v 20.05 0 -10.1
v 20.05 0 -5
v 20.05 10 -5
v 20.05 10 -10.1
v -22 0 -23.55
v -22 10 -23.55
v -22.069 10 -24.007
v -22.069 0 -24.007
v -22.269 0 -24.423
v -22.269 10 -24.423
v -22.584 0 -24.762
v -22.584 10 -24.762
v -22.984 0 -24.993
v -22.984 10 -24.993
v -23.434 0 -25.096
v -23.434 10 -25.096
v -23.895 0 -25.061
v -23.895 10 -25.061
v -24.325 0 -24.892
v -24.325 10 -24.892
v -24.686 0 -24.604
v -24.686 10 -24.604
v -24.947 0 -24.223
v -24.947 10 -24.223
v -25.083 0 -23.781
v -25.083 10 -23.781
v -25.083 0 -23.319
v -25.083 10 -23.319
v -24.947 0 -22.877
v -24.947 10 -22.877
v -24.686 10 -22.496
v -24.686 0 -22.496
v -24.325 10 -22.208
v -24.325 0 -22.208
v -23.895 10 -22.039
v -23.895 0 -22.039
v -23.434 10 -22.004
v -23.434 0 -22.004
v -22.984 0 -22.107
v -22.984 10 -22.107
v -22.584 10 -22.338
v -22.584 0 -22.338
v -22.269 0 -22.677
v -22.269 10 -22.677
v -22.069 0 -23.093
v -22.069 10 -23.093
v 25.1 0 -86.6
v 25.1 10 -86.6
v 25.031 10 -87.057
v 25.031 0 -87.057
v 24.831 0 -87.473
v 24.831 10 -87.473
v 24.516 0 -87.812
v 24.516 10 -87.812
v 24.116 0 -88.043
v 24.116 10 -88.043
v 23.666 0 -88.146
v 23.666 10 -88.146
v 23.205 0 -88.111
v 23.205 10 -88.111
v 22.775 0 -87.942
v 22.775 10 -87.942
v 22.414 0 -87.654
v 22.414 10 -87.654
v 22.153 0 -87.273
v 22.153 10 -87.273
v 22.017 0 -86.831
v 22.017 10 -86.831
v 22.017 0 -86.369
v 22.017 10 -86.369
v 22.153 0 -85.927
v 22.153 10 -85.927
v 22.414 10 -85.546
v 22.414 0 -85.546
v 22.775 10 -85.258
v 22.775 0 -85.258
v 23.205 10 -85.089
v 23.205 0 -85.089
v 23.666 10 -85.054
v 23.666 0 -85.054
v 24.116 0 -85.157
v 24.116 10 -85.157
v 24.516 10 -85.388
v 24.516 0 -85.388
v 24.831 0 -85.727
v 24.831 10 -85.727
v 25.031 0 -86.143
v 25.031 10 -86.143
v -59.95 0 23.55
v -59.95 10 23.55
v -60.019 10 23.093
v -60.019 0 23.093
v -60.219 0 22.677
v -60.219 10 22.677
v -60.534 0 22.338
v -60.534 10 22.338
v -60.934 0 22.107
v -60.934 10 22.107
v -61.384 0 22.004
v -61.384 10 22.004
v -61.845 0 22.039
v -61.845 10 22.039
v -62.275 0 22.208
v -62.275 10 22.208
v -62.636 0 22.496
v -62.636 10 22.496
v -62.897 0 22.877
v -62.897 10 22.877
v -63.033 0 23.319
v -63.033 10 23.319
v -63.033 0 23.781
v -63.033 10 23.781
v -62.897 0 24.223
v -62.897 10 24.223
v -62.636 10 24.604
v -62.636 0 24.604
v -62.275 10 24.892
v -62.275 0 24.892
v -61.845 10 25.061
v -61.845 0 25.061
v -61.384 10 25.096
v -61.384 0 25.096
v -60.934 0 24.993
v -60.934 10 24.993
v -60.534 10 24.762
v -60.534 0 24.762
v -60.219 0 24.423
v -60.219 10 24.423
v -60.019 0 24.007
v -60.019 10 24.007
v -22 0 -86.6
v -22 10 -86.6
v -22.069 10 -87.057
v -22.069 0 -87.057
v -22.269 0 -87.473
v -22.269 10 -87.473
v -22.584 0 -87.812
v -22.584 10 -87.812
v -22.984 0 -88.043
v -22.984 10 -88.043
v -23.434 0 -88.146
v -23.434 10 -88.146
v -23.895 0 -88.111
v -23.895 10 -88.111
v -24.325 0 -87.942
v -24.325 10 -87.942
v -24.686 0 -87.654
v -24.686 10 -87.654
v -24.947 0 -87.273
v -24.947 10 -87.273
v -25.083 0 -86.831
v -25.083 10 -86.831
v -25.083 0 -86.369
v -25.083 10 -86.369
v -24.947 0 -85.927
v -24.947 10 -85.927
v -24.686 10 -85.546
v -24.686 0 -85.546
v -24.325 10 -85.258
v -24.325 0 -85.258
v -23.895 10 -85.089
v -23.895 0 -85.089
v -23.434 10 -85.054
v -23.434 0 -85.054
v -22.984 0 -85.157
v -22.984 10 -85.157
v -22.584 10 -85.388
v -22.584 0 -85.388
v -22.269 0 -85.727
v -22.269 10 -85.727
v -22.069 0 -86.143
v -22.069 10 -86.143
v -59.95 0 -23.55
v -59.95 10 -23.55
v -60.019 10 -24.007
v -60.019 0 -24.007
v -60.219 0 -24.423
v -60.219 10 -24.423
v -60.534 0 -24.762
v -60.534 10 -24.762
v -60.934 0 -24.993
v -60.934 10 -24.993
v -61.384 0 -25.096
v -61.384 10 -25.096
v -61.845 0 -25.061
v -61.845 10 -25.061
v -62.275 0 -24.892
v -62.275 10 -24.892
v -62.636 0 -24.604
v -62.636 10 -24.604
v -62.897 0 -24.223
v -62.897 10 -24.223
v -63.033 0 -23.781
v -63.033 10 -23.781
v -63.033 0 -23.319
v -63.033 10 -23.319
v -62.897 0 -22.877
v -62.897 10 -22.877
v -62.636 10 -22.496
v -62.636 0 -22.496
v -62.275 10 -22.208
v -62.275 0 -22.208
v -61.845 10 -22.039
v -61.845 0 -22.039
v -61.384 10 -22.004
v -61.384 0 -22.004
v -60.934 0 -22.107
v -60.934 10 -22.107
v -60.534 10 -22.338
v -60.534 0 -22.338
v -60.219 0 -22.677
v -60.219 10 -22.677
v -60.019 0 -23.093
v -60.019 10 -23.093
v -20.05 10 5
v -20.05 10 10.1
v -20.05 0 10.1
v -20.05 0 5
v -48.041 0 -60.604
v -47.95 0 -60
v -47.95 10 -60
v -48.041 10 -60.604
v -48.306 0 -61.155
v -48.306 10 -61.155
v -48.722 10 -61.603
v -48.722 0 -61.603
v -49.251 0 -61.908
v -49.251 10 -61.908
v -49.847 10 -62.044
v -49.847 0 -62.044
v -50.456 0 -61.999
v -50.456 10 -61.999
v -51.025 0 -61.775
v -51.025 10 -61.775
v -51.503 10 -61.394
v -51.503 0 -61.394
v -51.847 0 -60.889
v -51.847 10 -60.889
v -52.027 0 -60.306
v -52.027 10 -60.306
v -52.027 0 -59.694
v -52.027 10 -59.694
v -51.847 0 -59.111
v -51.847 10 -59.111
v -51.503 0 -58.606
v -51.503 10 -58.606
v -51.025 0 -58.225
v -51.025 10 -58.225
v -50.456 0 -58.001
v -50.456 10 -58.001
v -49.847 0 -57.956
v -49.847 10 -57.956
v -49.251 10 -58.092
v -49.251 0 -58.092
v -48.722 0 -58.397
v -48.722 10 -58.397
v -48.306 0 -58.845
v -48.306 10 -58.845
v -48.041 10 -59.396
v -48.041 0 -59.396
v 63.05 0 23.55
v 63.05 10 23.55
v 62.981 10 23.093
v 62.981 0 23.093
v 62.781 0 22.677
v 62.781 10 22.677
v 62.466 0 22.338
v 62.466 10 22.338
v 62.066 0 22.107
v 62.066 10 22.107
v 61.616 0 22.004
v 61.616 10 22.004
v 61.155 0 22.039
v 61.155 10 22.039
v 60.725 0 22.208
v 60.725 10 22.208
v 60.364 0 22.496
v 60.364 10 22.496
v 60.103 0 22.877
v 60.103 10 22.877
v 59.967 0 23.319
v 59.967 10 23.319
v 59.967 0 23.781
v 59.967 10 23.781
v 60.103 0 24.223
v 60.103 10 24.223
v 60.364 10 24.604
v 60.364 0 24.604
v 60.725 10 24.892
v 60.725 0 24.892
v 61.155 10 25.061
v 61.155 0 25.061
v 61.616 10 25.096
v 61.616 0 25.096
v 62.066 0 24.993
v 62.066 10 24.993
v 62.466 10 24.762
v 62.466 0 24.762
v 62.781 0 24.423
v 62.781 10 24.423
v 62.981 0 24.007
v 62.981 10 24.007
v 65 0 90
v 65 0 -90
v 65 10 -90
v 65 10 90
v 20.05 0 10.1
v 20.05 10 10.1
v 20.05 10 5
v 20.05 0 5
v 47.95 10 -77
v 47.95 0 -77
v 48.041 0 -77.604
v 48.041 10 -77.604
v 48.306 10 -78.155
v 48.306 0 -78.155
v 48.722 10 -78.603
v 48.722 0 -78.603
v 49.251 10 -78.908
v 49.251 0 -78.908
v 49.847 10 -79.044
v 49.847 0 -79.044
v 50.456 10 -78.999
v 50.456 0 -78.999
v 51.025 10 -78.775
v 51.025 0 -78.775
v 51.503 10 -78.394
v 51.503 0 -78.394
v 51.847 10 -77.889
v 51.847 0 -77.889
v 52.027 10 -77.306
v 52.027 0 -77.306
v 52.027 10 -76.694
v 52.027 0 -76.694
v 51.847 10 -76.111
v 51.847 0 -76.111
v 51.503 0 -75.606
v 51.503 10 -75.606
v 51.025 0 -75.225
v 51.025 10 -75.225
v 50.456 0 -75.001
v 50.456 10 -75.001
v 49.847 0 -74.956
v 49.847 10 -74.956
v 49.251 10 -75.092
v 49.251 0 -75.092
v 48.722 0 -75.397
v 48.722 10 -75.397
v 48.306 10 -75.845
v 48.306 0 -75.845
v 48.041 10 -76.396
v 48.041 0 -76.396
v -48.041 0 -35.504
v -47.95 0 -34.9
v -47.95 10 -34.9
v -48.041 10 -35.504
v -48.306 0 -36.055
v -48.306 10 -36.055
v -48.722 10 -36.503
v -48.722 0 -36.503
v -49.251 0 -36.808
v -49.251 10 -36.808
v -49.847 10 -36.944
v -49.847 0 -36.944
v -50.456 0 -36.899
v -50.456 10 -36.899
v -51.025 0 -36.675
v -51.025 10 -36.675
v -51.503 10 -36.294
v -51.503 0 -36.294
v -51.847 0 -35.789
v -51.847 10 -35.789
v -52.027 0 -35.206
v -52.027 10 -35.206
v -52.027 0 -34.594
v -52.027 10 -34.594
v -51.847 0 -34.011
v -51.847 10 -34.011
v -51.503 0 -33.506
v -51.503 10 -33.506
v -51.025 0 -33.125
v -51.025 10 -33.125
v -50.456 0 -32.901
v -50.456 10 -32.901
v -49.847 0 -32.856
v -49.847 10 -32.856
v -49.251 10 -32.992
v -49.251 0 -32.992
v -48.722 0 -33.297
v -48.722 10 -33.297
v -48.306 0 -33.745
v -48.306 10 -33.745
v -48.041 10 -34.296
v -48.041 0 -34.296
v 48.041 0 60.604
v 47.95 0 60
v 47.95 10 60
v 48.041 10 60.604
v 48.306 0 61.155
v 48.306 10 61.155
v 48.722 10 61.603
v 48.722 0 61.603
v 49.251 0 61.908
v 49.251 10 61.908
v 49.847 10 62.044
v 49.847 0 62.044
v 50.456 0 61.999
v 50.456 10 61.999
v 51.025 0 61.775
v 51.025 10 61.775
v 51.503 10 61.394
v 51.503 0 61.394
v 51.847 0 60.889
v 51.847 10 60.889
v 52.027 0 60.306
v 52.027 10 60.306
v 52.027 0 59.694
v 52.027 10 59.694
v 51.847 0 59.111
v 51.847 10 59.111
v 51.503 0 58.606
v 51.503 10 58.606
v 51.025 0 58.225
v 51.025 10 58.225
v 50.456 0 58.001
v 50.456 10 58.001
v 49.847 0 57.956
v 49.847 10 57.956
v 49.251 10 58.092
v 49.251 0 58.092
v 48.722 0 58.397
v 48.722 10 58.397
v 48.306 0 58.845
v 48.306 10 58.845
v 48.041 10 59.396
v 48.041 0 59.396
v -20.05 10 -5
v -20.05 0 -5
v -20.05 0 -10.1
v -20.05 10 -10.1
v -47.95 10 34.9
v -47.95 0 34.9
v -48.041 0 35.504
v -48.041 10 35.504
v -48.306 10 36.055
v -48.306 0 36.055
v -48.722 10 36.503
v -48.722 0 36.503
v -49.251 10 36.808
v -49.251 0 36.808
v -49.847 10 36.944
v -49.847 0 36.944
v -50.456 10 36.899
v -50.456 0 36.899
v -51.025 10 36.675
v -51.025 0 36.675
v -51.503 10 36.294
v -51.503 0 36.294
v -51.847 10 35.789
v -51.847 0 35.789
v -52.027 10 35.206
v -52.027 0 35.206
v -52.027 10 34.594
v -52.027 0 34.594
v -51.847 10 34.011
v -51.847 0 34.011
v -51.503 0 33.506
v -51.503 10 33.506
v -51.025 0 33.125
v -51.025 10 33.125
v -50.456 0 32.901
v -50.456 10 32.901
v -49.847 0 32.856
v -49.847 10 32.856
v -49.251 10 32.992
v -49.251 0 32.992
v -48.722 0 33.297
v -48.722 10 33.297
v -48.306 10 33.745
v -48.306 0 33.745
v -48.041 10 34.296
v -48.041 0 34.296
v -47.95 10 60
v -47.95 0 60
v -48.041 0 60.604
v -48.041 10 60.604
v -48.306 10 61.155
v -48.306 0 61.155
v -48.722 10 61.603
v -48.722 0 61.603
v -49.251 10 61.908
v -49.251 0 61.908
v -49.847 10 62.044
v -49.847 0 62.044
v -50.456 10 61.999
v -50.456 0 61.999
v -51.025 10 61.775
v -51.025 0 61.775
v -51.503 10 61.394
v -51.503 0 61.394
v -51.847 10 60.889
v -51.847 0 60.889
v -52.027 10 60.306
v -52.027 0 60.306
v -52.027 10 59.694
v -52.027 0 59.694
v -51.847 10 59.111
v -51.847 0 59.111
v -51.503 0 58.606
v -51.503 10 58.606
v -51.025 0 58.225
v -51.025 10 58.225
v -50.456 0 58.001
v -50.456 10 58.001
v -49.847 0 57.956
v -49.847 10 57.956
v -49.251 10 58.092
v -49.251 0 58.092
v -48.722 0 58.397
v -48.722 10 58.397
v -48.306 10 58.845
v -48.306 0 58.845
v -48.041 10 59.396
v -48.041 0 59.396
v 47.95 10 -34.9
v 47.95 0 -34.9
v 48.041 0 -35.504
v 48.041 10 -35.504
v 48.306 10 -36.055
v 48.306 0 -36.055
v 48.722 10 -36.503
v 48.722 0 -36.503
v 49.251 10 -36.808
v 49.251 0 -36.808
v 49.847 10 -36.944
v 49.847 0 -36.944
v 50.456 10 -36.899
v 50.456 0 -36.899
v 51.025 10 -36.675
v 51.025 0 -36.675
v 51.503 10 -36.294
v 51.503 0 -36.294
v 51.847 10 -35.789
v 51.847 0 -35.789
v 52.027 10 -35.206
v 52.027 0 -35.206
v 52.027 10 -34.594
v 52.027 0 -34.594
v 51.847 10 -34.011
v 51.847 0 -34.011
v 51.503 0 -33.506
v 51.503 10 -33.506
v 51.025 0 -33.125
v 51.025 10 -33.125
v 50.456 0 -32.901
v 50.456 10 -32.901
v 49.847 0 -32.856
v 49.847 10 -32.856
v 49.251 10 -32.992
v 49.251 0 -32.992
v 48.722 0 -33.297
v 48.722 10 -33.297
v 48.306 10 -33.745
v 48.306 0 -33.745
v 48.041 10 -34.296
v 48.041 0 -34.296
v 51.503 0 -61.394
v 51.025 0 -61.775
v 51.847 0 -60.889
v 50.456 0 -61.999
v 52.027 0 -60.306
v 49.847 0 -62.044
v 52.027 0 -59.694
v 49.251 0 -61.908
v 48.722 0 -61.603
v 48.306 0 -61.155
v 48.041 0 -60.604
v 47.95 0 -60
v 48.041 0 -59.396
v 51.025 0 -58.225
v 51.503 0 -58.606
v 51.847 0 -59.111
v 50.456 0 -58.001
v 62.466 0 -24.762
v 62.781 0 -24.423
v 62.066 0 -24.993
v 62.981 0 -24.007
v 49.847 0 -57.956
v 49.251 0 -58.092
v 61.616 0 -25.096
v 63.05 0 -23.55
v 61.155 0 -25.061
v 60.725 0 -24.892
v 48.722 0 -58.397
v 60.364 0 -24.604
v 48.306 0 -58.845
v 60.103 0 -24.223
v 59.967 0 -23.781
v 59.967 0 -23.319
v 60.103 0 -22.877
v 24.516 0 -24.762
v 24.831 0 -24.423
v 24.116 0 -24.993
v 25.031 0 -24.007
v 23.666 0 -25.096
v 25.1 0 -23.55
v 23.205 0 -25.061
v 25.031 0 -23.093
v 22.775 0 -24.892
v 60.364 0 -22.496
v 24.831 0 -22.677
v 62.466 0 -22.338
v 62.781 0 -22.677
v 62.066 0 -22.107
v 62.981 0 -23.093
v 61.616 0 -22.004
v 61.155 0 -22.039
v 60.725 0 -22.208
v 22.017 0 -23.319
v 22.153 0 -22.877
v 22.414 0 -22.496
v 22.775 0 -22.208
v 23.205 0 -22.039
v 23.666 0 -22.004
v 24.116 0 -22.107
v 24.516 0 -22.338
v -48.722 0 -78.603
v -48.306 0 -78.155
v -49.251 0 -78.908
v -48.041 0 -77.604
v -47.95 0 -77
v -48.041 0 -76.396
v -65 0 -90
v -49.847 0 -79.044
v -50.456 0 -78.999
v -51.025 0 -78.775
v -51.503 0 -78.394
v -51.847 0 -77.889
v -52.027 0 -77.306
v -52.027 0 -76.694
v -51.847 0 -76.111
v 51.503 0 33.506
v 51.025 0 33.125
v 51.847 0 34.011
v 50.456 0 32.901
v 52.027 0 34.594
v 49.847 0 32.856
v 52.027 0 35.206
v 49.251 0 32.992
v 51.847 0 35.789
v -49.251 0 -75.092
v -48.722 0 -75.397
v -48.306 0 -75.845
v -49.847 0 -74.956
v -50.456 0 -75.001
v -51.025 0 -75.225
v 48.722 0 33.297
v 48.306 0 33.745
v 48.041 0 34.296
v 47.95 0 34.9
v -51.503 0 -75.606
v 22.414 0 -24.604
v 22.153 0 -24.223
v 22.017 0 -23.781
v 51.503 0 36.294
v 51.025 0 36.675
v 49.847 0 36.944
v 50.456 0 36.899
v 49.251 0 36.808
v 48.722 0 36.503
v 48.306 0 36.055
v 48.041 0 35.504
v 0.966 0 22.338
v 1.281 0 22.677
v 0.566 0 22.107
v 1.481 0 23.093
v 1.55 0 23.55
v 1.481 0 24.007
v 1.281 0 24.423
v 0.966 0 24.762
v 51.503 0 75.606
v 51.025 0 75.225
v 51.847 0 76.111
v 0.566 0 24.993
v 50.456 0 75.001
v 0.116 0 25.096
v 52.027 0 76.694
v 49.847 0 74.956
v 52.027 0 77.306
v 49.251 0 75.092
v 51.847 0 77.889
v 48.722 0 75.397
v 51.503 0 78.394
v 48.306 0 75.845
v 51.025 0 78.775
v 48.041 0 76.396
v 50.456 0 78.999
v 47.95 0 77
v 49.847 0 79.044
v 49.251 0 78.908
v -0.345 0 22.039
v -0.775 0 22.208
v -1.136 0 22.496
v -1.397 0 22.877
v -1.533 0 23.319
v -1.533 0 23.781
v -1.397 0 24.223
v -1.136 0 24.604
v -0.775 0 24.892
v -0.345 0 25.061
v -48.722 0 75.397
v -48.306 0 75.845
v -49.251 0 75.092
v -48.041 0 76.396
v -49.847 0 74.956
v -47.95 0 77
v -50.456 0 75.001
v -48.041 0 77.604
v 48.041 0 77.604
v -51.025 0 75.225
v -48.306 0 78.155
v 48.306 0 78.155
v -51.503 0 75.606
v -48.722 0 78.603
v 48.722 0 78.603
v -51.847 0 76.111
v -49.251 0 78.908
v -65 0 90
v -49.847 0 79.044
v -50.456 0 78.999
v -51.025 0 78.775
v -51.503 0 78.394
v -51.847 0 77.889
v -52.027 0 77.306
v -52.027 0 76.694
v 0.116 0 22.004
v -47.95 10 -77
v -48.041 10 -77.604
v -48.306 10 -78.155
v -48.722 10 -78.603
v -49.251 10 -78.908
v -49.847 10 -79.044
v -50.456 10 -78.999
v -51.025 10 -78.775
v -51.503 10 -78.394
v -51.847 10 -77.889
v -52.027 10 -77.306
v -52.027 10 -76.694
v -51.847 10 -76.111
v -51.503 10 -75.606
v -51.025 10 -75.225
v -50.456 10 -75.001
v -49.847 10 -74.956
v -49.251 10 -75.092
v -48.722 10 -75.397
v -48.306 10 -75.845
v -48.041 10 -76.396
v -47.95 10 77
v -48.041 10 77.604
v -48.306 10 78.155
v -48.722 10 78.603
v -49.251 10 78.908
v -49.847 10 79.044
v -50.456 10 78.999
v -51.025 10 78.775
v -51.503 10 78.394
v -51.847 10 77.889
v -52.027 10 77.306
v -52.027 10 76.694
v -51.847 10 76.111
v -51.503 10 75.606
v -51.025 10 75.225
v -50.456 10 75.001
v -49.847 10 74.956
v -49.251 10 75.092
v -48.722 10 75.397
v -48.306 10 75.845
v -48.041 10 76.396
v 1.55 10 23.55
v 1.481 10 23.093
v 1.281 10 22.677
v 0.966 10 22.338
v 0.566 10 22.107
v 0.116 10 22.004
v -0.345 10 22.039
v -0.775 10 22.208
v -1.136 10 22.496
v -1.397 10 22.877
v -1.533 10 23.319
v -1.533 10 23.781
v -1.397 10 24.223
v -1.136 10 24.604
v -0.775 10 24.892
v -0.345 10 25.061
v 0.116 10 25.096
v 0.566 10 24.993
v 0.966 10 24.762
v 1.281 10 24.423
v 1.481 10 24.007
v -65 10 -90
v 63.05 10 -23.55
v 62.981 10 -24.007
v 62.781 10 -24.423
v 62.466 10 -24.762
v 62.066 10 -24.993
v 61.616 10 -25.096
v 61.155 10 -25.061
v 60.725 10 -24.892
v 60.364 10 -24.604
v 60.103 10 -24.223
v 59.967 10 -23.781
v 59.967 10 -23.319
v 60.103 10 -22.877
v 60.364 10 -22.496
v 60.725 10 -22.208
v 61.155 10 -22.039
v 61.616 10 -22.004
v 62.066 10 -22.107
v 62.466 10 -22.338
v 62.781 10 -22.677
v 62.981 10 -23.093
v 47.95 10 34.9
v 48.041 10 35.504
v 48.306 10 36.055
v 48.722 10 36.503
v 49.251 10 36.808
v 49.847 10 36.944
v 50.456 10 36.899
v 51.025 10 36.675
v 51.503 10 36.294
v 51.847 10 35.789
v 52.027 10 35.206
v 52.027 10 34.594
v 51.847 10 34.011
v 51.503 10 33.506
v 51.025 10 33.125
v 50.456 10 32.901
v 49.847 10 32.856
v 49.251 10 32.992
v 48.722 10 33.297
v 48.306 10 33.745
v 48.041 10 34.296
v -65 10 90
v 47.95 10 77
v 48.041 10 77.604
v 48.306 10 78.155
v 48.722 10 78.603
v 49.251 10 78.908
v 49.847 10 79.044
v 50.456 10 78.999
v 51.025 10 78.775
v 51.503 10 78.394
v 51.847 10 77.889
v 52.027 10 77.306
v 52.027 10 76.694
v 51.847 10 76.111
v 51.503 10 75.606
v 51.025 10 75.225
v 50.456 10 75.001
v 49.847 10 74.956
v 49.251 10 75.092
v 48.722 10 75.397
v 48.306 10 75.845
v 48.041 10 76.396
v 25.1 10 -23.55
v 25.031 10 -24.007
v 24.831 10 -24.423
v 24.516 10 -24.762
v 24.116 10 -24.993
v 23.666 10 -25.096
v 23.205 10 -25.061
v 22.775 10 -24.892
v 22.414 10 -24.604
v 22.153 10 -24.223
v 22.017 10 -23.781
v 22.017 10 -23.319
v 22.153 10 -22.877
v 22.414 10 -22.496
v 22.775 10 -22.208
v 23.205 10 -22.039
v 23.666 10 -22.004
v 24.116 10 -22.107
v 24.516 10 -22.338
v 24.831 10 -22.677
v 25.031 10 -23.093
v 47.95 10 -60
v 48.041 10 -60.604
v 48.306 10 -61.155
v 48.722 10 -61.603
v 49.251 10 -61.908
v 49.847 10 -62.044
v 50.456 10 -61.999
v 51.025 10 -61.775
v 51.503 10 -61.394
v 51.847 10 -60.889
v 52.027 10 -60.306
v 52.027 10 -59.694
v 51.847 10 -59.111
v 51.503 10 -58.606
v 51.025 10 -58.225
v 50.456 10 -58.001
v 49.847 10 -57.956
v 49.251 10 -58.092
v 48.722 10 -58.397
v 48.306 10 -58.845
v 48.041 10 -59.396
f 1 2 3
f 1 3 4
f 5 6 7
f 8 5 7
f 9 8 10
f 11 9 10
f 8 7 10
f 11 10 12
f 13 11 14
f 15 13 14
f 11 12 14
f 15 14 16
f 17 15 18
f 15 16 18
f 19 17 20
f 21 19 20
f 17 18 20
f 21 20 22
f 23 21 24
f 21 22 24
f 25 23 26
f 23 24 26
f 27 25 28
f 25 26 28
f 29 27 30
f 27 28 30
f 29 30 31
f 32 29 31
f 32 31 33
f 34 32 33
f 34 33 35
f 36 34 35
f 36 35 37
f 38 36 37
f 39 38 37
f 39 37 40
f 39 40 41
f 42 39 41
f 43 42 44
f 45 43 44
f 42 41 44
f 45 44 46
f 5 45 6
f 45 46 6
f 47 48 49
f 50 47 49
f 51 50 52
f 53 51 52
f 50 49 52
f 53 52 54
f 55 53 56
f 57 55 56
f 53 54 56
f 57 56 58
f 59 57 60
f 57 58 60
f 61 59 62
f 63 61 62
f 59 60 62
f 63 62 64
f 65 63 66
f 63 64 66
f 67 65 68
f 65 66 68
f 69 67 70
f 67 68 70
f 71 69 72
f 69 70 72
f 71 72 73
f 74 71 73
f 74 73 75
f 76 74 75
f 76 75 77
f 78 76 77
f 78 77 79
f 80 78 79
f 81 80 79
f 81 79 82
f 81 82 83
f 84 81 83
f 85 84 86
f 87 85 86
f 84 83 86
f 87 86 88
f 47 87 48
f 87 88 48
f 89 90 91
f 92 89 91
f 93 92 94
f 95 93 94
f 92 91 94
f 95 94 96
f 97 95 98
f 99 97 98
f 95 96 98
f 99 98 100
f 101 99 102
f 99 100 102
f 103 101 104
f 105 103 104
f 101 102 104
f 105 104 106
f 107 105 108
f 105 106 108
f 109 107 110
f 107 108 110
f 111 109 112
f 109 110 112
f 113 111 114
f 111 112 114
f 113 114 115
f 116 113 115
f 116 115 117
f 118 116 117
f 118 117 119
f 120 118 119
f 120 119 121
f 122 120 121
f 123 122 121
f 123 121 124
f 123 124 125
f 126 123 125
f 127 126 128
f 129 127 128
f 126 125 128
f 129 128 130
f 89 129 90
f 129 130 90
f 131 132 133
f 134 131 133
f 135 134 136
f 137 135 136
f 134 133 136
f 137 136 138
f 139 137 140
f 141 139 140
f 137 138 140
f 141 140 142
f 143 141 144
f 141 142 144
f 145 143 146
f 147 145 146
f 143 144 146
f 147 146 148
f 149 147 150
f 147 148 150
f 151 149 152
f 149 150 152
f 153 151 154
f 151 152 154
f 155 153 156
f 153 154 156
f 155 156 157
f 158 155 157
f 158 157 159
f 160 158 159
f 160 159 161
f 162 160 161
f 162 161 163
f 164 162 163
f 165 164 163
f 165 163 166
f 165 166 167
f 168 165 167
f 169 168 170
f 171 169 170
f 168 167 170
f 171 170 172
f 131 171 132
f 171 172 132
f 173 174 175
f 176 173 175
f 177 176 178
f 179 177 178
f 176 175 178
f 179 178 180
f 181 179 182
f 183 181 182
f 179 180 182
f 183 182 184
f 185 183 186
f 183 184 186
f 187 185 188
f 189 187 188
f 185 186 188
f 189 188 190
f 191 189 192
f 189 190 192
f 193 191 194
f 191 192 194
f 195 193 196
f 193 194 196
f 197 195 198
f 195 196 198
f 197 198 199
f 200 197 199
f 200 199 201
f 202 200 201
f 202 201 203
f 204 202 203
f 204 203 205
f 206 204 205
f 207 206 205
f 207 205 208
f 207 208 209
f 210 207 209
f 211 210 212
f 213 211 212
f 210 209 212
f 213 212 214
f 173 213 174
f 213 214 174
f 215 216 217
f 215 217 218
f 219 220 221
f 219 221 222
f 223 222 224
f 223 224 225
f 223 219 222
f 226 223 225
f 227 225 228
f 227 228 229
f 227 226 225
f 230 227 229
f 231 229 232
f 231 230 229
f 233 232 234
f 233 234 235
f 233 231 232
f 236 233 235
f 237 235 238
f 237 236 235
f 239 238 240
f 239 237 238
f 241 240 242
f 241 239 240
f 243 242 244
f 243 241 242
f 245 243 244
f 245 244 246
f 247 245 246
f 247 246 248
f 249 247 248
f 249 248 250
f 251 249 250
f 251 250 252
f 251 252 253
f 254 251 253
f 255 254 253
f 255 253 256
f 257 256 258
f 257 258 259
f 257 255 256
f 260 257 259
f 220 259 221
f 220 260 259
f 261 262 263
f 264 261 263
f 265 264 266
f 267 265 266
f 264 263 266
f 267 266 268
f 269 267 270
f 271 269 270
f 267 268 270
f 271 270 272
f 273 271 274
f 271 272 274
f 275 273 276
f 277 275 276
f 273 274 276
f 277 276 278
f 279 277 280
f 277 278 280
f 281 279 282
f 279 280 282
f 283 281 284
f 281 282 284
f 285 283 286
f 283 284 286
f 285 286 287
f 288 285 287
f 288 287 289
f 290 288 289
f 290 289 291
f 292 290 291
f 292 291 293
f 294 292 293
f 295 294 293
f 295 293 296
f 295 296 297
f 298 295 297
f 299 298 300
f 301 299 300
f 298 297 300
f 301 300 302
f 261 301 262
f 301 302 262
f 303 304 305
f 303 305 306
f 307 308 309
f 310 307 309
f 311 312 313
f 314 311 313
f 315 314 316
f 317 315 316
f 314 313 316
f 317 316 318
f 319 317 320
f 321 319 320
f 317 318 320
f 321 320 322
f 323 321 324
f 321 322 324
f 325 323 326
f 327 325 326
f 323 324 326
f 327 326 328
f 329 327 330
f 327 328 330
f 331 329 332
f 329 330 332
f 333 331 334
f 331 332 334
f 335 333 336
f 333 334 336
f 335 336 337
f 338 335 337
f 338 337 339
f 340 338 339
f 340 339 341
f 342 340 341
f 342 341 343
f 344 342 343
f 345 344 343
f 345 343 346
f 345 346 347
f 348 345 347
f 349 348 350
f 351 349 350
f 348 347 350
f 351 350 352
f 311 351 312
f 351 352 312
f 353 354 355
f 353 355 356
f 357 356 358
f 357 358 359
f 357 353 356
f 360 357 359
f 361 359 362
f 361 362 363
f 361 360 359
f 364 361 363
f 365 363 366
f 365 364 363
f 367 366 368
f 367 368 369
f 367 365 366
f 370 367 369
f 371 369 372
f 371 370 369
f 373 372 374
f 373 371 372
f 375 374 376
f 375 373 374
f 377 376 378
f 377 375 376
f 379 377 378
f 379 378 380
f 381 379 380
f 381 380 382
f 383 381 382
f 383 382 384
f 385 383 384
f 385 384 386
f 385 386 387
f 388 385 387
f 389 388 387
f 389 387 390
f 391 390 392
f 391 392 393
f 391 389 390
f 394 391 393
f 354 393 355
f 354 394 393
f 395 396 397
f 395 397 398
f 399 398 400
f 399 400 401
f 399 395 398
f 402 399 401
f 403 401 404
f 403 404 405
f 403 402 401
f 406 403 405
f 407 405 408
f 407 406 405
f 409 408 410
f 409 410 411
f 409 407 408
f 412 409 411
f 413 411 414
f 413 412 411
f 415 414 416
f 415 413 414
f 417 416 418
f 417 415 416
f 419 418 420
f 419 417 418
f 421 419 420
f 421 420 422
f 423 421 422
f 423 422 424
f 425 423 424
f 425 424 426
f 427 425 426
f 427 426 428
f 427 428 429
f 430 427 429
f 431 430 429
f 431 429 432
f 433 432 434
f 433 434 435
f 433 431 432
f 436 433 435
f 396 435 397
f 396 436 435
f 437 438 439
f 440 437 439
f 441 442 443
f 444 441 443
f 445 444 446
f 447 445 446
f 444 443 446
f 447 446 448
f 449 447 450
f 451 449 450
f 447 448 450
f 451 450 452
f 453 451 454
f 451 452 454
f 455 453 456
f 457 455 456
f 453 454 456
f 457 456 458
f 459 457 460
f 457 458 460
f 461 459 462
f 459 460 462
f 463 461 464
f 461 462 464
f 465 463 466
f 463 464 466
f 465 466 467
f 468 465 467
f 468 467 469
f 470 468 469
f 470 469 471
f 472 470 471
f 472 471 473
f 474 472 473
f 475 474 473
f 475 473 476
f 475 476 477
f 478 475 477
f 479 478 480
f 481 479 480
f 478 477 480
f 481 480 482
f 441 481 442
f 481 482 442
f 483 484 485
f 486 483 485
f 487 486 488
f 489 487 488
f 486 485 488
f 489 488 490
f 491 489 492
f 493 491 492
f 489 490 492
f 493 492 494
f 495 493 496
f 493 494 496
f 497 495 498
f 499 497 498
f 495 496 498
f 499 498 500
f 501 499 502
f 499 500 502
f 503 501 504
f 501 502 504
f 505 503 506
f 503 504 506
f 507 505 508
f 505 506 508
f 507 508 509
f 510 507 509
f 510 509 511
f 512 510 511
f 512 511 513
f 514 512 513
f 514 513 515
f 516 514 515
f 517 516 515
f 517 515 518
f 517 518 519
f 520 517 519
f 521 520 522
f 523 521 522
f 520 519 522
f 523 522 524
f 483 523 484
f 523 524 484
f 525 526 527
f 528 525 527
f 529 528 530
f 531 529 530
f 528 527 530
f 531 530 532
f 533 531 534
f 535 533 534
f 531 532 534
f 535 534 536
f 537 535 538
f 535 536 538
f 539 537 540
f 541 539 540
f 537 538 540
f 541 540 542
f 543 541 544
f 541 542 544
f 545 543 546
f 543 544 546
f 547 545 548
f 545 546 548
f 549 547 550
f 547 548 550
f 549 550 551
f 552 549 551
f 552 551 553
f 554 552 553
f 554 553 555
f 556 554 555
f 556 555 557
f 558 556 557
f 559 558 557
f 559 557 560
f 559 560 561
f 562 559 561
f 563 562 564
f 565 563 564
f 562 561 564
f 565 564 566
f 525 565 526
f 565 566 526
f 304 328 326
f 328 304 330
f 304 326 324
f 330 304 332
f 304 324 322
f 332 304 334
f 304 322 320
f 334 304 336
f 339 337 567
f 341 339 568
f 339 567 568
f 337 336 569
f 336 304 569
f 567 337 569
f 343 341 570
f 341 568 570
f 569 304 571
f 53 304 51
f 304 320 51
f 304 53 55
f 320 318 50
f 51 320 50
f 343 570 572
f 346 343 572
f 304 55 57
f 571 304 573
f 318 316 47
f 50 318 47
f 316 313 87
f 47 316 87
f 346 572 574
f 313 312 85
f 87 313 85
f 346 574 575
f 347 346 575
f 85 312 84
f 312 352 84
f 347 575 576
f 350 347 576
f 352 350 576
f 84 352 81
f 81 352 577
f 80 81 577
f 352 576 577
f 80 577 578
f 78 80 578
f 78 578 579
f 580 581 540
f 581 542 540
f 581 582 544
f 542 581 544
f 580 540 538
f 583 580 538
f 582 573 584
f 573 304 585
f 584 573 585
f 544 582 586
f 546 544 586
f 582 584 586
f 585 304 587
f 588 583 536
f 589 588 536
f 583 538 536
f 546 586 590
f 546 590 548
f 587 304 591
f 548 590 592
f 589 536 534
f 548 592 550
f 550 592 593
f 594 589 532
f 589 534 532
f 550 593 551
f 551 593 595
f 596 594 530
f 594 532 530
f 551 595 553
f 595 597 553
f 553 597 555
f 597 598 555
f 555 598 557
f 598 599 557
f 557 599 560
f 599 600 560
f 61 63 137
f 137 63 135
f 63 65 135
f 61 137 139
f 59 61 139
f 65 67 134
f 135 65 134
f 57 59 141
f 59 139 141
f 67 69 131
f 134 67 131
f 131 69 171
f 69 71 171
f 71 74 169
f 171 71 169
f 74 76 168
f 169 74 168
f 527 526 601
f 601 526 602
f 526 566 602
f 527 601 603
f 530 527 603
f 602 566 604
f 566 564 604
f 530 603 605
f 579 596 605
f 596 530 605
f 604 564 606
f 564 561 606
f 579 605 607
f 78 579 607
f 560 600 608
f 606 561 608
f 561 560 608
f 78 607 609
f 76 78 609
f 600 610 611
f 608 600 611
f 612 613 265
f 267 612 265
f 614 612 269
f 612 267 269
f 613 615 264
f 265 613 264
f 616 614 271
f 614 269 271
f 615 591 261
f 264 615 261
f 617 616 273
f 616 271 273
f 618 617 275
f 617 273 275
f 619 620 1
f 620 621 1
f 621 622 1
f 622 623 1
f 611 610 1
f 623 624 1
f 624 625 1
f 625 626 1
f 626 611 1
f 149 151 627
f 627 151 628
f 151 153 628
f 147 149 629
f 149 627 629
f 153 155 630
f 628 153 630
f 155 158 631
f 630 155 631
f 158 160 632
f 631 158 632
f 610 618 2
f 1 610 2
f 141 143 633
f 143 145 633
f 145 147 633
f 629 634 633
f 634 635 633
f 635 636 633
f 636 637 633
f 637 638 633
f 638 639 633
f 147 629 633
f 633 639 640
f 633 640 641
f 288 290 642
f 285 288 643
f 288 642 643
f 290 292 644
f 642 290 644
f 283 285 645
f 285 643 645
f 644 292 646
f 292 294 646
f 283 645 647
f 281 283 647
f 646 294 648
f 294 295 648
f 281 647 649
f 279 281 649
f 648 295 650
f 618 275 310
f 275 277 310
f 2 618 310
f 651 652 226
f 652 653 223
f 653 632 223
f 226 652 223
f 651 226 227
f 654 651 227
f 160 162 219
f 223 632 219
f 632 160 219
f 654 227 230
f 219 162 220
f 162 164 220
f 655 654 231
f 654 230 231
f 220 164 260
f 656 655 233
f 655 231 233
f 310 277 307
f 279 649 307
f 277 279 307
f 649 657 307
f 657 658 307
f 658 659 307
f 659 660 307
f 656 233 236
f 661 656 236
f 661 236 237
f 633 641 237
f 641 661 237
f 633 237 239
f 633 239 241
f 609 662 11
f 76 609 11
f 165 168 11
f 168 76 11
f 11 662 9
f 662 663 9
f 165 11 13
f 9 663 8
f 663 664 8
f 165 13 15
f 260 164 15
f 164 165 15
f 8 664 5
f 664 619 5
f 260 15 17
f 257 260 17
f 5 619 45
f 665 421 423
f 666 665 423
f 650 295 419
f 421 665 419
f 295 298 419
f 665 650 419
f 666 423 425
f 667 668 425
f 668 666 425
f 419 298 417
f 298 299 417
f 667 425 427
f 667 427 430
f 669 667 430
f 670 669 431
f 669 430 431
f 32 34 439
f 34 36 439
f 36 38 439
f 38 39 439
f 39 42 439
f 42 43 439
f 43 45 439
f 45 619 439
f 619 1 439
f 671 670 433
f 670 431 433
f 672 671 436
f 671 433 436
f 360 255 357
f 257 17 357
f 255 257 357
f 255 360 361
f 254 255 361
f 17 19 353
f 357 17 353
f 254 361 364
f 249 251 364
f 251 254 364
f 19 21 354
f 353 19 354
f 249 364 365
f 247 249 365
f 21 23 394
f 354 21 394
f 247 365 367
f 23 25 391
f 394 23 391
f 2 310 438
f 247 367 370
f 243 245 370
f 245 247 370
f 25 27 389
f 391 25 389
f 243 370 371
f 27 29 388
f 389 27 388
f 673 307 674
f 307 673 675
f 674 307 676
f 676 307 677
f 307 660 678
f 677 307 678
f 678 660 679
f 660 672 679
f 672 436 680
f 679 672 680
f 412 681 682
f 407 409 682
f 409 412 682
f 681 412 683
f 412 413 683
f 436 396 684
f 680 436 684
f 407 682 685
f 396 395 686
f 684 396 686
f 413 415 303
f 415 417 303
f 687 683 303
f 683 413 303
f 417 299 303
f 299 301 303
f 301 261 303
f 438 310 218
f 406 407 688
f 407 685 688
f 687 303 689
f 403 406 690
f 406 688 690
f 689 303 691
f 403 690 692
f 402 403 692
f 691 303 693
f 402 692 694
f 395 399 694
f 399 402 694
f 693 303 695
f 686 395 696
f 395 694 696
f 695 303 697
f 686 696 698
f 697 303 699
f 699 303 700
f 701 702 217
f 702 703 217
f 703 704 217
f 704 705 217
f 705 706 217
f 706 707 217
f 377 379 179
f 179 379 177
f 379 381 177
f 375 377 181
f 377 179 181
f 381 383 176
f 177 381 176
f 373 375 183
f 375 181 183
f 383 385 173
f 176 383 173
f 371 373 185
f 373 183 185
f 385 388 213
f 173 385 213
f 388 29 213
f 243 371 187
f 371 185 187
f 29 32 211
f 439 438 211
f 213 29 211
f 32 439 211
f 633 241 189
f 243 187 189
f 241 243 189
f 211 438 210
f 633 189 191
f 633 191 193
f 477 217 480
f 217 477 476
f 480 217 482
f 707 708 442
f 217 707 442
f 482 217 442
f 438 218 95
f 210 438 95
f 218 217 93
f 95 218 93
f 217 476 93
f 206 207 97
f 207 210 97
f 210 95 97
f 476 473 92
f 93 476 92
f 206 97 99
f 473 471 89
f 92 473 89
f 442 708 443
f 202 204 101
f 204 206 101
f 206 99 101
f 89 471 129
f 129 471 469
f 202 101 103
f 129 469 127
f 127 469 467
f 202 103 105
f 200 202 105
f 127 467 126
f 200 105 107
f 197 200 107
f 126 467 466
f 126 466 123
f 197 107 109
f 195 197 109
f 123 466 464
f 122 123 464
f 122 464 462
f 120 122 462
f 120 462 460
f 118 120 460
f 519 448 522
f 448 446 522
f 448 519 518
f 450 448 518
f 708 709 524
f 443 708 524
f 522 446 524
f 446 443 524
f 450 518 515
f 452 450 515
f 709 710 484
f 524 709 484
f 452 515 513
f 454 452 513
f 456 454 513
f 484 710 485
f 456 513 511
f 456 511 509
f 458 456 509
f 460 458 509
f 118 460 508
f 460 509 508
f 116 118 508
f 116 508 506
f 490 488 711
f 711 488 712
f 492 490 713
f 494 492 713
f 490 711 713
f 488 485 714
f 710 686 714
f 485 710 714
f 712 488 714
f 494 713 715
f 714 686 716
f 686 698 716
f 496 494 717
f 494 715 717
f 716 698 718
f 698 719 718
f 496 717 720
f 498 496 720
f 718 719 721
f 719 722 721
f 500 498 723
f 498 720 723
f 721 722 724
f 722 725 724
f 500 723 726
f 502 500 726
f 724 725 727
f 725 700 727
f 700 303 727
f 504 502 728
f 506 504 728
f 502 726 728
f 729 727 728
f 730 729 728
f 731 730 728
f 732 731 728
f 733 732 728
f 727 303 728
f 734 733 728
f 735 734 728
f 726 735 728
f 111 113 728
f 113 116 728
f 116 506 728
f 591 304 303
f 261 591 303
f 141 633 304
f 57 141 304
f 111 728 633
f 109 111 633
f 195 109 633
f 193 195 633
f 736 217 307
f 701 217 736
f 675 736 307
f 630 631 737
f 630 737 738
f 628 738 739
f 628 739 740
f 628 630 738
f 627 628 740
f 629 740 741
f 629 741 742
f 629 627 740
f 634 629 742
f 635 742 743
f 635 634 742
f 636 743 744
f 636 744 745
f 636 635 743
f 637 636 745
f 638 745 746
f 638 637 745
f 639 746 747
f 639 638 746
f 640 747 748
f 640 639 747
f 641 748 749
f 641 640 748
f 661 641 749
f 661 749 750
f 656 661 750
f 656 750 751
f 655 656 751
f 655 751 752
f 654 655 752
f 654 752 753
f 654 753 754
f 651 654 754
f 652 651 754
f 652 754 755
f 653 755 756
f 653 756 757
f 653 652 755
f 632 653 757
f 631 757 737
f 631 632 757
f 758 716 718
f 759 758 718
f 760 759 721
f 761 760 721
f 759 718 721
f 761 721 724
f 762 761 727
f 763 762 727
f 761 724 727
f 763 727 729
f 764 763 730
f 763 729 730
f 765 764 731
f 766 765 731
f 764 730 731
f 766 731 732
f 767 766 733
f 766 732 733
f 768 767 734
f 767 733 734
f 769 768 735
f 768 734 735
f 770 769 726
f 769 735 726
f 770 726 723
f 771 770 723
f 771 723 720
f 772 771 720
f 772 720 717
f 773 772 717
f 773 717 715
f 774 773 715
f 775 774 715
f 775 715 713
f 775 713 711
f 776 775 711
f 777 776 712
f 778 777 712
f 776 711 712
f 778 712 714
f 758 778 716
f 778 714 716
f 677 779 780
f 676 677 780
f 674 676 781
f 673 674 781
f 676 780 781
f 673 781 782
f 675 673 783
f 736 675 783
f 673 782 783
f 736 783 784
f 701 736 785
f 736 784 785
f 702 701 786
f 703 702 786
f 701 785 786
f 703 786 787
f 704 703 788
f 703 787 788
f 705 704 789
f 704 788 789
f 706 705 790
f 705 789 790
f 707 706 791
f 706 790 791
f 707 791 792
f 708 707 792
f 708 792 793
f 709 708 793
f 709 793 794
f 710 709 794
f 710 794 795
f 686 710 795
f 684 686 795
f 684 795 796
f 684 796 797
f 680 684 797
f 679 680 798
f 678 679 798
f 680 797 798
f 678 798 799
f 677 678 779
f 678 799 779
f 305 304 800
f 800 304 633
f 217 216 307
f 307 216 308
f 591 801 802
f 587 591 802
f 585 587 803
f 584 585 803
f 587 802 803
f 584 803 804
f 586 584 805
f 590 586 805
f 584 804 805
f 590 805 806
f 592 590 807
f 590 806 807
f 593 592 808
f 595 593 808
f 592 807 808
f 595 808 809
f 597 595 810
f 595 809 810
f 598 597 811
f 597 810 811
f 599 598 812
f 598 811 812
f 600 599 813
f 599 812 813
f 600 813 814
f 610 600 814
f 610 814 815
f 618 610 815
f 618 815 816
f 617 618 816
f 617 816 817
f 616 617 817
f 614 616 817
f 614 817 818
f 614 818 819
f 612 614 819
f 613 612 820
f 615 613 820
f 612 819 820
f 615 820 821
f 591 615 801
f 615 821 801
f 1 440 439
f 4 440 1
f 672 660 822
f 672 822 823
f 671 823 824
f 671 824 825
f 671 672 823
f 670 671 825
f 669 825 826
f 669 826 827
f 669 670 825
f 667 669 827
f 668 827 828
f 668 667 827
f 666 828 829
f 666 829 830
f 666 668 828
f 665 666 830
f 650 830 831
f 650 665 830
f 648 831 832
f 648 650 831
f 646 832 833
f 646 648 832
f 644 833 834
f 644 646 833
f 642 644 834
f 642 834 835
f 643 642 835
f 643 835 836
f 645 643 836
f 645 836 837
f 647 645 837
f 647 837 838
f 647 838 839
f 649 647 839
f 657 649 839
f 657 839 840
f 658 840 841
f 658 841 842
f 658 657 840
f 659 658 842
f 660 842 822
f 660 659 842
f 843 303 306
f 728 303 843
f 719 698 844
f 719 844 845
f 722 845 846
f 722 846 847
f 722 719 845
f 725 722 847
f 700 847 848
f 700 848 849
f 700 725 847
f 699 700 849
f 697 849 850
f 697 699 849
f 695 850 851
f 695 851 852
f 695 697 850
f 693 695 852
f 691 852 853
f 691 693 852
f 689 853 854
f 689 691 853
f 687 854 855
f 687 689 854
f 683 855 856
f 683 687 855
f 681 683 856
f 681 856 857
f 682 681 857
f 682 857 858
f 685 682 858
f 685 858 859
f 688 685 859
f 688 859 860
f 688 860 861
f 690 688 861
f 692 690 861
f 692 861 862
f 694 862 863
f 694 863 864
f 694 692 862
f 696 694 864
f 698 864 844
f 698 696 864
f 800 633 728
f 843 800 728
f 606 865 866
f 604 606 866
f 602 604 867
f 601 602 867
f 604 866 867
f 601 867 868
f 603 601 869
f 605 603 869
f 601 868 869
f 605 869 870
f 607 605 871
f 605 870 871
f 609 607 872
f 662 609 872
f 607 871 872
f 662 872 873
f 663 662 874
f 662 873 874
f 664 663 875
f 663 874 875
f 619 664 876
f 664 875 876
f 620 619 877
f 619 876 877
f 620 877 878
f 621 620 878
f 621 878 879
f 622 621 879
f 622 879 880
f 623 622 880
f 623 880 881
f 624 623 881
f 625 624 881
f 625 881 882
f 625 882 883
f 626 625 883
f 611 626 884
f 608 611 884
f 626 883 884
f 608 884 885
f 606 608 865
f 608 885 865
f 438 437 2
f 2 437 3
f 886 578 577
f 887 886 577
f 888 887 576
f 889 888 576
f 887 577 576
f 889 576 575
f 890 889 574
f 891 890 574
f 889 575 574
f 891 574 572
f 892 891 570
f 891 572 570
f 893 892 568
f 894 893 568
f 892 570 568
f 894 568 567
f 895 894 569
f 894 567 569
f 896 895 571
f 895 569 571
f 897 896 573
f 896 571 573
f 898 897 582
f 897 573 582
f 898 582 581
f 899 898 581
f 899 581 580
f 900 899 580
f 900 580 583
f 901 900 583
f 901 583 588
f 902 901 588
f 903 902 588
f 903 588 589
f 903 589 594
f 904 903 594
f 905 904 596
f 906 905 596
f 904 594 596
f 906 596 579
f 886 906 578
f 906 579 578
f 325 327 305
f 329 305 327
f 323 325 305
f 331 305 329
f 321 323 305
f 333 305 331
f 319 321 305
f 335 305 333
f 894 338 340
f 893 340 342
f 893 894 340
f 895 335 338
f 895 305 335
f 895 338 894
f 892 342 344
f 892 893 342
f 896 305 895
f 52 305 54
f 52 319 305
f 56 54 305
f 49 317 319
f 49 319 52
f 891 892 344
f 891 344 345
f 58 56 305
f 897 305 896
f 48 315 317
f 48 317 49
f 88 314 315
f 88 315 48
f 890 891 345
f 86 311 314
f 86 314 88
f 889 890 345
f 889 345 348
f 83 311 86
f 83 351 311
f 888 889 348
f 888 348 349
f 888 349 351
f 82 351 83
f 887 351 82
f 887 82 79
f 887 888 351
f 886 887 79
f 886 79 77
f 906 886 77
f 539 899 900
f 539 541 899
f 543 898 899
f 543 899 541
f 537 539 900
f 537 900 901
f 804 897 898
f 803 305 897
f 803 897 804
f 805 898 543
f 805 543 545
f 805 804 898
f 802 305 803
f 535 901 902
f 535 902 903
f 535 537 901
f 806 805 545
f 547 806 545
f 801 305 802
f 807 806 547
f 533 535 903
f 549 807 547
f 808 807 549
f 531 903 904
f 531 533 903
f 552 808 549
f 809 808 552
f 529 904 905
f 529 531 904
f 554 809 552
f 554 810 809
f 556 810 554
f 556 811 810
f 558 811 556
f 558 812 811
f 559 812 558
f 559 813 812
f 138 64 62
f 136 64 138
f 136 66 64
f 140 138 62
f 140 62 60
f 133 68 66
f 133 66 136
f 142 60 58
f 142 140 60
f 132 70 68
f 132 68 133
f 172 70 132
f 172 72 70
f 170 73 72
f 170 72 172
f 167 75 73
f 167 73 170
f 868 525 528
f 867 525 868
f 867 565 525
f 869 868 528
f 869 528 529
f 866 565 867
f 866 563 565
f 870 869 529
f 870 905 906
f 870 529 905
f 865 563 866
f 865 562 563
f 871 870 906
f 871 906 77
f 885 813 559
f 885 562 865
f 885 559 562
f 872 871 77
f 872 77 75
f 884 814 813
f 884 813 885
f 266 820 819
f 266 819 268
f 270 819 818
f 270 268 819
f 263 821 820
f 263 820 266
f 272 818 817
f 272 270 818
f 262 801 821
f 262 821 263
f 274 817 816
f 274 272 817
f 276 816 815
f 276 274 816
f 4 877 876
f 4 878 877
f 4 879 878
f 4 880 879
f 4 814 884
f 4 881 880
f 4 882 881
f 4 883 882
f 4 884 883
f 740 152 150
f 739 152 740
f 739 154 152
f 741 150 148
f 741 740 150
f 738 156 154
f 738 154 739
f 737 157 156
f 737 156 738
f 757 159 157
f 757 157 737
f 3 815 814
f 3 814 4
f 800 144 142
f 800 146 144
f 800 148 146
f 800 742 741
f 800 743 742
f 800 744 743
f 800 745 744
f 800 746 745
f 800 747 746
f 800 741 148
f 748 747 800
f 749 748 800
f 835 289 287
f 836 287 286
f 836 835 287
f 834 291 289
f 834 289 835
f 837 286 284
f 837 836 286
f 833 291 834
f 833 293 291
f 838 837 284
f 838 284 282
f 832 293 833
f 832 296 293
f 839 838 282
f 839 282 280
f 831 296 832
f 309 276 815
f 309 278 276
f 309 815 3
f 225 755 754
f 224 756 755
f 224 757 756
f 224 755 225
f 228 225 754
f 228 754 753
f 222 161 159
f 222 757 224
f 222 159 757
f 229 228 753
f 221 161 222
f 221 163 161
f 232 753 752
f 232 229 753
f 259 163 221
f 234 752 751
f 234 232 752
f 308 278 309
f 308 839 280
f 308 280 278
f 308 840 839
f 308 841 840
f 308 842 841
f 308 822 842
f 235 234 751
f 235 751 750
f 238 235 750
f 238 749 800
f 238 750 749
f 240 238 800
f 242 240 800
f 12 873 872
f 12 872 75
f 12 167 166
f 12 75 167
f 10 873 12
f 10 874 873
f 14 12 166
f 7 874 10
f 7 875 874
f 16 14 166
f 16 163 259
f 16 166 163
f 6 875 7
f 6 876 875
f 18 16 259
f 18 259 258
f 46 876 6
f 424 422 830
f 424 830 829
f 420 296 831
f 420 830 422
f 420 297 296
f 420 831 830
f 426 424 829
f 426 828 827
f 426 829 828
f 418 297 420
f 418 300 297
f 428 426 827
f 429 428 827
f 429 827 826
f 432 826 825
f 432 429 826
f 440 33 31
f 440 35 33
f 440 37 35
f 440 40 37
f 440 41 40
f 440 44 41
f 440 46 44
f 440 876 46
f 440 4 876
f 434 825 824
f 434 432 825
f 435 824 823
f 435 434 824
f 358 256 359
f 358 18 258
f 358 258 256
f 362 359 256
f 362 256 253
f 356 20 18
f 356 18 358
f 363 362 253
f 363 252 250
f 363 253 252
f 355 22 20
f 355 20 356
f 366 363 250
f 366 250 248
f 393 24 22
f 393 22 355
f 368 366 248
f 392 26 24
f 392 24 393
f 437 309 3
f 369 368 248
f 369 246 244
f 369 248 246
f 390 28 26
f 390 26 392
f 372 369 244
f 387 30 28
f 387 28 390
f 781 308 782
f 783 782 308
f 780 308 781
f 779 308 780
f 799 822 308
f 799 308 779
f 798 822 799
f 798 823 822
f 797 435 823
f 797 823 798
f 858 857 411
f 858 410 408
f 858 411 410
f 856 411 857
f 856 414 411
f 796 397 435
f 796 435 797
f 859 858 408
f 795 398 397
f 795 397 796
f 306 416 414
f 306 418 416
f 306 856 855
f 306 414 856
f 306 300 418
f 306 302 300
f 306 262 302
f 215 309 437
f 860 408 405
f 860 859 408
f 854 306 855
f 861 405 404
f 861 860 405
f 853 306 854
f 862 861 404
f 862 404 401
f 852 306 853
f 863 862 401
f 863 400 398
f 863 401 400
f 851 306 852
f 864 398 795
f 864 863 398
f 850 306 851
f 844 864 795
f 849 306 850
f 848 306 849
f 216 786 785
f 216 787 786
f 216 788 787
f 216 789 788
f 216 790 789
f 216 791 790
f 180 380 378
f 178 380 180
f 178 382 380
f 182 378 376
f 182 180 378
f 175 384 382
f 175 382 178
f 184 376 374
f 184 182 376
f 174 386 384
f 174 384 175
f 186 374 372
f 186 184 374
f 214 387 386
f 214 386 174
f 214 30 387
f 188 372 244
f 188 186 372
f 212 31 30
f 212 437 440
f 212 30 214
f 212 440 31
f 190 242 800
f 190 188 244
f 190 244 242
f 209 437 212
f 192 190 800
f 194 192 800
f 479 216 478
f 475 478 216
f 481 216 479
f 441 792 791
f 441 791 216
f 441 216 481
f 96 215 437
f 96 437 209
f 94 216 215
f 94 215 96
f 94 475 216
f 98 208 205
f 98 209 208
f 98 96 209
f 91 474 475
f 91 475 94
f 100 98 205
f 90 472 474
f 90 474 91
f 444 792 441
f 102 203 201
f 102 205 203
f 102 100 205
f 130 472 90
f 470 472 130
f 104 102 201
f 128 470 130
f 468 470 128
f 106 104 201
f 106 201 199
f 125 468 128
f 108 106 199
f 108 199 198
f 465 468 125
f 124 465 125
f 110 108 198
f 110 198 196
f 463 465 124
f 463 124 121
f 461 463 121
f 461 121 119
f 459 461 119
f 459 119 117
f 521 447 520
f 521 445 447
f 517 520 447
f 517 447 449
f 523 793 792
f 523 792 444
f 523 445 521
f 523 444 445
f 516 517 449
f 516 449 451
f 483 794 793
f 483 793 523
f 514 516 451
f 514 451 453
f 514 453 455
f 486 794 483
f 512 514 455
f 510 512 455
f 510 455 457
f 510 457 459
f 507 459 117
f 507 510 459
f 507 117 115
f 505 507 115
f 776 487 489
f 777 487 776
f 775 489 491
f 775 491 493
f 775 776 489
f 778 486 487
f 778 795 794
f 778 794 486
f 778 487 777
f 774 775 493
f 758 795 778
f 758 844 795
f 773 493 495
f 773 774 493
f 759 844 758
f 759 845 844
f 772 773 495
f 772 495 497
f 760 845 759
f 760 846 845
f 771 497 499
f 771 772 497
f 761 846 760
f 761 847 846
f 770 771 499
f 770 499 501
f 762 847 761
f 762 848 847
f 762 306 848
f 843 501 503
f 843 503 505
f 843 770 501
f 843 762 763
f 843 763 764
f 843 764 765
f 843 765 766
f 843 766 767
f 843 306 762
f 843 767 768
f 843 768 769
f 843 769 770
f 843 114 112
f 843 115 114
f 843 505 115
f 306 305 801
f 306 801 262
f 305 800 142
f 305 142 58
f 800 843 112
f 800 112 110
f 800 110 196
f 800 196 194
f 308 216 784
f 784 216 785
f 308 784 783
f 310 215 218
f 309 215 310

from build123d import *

# Parameters (mm, degrees)
SKETCH1_W               = 65
SKETCH1_H               = 90
SKETCH1_R               = 2.05
BOSS_EXTRUDE1_DEPTH     = 10
MIRROR2_COPY_1_SKETCH_W = 65
MIRROR2_COPY_1_SKETCH_H = 90
MIRROR2_COPY_1_SKETCH_R = 2.05
MIRROR2_COPY_1_DEPTH    = 10
SKETCH2_W               = 40.1
SKETCH2_H               = 5.1
CUT_EXTRUDE1_DEPTH      = 10
SKETCH3_R               = 1.55
CUT_EXTRUDE2_DEPTH      = 10


with BuildPart() as part:
    # Sketch1 → Boss-Extrude1 (new body)
    with BuildSketch(Plane(origin=(0, 0, 0), x_dir=(1, 0, 0), z_dir=(0, 1, 0))):
        with Locations((-32.5, 45)):
            Rectangle(SKETCH1_W, SKETCH1_H)
        with Locations((-50, 77)):
            Circle(SKETCH1_R, mode=Mode.SUBTRACT)
        with Locations((-50, 34.9)):
            Circle(SKETCH1_R, mode=Mode.SUBTRACT)
        with Locations((-50, 60)):
            Circle(SKETCH1_R, mode=Mode.SUBTRACT)
    boss_extrude1 = extrude(amount=BOSS_EXTRUDE1_DEPTH)

    # Mirror1: Boss-Extrude1 across Right Plane
    add(boss_extrude1.mirror(Plane(origin=(0, 0, 0), x_dir=(0, 0, -1), z_dir=(1, 0, 0))))

    # Mirror2: Boss-Extrude1 across Front Plane
    add(boss_extrude1.mirror(Plane.XY))

    # Mirror2 copy 1 sketch → Mirror2 copy 1 (add)
    with BuildSketch(Plane(origin=(0, 0, 0), x_dir=(-1, 0, 0), z_dir=(0, 1, 0))):
        with Locations((-32.5, 45)):
            Rectangle(MIRROR2_COPY_1_SKETCH_W, MIRROR2_COPY_1_SKETCH_H)
        with Locations((-50, 77)):
            Circle(MIRROR2_COPY_1_SKETCH_R, mode=Mode.SUBTRACT)
        with Locations((-50, 34.9)):
            Circle(MIRROR2_COPY_1_SKETCH_R, mode=Mode.SUBTRACT)
        with Locations((-50, 60)):
            Circle(MIRROR2_COPY_1_SKETCH_R, mode=Mode.SUBTRACT)
    extrude(amount=MIRROR2_COPY_1_DEPTH)

    # Sketch2 → Cut-Extrude1 (cut)
    with BuildSketch(Plane(origin=(0, 10, 0), x_dir=(1, 0, 0), z_dir=(0, 1, 0))):
        with Locations((0, 7.55)):
            Rectangle(SKETCH2_W, SKETCH2_H)
        with Locations((0, -7.55)):
            Rectangle(SKETCH2_W, SKETCH2_H)
    extrude(amount=-CUT_EXTRUDE1_DEPTH, mode=Mode.SUBTRACT)

    # Sketch3 → Cut-Extrude2 (cut)
    with BuildSketch(Plane(origin=(0, 10, 0), x_dir=(1, 0, 0), z_dir=(0, 1, 0))):
        with Locations((-23.55, 86.6)):
            Circle(SKETCH3_R)
        with Locations((-23.55, 23.55)):
            Circle(SKETCH3_R)
        with Locations((-61.5, 23.55)):
            Circle(SKETCH3_R)
        with Locations((23.55, 23.55)):
            Circle(SKETCH3_R)
        with Locations((23.55, 86.6)):
            Circle(SKETCH3_R)
        with Locations((61.5, 23.55)):
            Circle(SKETCH3_R)
        with Locations((-61.5, -23.55)):
            Circle(SKETCH3_R)
        with Locations((0, -23.55)):
            Circle(SKETCH3_R)
        with Locations((61.5, -23.55)):
            Circle(SKETCH3_R)
    extrude(amount=-CUT_EXTRUDE2_DEPTH, mode=Mode.SUBTRACT)


solid = part.part
